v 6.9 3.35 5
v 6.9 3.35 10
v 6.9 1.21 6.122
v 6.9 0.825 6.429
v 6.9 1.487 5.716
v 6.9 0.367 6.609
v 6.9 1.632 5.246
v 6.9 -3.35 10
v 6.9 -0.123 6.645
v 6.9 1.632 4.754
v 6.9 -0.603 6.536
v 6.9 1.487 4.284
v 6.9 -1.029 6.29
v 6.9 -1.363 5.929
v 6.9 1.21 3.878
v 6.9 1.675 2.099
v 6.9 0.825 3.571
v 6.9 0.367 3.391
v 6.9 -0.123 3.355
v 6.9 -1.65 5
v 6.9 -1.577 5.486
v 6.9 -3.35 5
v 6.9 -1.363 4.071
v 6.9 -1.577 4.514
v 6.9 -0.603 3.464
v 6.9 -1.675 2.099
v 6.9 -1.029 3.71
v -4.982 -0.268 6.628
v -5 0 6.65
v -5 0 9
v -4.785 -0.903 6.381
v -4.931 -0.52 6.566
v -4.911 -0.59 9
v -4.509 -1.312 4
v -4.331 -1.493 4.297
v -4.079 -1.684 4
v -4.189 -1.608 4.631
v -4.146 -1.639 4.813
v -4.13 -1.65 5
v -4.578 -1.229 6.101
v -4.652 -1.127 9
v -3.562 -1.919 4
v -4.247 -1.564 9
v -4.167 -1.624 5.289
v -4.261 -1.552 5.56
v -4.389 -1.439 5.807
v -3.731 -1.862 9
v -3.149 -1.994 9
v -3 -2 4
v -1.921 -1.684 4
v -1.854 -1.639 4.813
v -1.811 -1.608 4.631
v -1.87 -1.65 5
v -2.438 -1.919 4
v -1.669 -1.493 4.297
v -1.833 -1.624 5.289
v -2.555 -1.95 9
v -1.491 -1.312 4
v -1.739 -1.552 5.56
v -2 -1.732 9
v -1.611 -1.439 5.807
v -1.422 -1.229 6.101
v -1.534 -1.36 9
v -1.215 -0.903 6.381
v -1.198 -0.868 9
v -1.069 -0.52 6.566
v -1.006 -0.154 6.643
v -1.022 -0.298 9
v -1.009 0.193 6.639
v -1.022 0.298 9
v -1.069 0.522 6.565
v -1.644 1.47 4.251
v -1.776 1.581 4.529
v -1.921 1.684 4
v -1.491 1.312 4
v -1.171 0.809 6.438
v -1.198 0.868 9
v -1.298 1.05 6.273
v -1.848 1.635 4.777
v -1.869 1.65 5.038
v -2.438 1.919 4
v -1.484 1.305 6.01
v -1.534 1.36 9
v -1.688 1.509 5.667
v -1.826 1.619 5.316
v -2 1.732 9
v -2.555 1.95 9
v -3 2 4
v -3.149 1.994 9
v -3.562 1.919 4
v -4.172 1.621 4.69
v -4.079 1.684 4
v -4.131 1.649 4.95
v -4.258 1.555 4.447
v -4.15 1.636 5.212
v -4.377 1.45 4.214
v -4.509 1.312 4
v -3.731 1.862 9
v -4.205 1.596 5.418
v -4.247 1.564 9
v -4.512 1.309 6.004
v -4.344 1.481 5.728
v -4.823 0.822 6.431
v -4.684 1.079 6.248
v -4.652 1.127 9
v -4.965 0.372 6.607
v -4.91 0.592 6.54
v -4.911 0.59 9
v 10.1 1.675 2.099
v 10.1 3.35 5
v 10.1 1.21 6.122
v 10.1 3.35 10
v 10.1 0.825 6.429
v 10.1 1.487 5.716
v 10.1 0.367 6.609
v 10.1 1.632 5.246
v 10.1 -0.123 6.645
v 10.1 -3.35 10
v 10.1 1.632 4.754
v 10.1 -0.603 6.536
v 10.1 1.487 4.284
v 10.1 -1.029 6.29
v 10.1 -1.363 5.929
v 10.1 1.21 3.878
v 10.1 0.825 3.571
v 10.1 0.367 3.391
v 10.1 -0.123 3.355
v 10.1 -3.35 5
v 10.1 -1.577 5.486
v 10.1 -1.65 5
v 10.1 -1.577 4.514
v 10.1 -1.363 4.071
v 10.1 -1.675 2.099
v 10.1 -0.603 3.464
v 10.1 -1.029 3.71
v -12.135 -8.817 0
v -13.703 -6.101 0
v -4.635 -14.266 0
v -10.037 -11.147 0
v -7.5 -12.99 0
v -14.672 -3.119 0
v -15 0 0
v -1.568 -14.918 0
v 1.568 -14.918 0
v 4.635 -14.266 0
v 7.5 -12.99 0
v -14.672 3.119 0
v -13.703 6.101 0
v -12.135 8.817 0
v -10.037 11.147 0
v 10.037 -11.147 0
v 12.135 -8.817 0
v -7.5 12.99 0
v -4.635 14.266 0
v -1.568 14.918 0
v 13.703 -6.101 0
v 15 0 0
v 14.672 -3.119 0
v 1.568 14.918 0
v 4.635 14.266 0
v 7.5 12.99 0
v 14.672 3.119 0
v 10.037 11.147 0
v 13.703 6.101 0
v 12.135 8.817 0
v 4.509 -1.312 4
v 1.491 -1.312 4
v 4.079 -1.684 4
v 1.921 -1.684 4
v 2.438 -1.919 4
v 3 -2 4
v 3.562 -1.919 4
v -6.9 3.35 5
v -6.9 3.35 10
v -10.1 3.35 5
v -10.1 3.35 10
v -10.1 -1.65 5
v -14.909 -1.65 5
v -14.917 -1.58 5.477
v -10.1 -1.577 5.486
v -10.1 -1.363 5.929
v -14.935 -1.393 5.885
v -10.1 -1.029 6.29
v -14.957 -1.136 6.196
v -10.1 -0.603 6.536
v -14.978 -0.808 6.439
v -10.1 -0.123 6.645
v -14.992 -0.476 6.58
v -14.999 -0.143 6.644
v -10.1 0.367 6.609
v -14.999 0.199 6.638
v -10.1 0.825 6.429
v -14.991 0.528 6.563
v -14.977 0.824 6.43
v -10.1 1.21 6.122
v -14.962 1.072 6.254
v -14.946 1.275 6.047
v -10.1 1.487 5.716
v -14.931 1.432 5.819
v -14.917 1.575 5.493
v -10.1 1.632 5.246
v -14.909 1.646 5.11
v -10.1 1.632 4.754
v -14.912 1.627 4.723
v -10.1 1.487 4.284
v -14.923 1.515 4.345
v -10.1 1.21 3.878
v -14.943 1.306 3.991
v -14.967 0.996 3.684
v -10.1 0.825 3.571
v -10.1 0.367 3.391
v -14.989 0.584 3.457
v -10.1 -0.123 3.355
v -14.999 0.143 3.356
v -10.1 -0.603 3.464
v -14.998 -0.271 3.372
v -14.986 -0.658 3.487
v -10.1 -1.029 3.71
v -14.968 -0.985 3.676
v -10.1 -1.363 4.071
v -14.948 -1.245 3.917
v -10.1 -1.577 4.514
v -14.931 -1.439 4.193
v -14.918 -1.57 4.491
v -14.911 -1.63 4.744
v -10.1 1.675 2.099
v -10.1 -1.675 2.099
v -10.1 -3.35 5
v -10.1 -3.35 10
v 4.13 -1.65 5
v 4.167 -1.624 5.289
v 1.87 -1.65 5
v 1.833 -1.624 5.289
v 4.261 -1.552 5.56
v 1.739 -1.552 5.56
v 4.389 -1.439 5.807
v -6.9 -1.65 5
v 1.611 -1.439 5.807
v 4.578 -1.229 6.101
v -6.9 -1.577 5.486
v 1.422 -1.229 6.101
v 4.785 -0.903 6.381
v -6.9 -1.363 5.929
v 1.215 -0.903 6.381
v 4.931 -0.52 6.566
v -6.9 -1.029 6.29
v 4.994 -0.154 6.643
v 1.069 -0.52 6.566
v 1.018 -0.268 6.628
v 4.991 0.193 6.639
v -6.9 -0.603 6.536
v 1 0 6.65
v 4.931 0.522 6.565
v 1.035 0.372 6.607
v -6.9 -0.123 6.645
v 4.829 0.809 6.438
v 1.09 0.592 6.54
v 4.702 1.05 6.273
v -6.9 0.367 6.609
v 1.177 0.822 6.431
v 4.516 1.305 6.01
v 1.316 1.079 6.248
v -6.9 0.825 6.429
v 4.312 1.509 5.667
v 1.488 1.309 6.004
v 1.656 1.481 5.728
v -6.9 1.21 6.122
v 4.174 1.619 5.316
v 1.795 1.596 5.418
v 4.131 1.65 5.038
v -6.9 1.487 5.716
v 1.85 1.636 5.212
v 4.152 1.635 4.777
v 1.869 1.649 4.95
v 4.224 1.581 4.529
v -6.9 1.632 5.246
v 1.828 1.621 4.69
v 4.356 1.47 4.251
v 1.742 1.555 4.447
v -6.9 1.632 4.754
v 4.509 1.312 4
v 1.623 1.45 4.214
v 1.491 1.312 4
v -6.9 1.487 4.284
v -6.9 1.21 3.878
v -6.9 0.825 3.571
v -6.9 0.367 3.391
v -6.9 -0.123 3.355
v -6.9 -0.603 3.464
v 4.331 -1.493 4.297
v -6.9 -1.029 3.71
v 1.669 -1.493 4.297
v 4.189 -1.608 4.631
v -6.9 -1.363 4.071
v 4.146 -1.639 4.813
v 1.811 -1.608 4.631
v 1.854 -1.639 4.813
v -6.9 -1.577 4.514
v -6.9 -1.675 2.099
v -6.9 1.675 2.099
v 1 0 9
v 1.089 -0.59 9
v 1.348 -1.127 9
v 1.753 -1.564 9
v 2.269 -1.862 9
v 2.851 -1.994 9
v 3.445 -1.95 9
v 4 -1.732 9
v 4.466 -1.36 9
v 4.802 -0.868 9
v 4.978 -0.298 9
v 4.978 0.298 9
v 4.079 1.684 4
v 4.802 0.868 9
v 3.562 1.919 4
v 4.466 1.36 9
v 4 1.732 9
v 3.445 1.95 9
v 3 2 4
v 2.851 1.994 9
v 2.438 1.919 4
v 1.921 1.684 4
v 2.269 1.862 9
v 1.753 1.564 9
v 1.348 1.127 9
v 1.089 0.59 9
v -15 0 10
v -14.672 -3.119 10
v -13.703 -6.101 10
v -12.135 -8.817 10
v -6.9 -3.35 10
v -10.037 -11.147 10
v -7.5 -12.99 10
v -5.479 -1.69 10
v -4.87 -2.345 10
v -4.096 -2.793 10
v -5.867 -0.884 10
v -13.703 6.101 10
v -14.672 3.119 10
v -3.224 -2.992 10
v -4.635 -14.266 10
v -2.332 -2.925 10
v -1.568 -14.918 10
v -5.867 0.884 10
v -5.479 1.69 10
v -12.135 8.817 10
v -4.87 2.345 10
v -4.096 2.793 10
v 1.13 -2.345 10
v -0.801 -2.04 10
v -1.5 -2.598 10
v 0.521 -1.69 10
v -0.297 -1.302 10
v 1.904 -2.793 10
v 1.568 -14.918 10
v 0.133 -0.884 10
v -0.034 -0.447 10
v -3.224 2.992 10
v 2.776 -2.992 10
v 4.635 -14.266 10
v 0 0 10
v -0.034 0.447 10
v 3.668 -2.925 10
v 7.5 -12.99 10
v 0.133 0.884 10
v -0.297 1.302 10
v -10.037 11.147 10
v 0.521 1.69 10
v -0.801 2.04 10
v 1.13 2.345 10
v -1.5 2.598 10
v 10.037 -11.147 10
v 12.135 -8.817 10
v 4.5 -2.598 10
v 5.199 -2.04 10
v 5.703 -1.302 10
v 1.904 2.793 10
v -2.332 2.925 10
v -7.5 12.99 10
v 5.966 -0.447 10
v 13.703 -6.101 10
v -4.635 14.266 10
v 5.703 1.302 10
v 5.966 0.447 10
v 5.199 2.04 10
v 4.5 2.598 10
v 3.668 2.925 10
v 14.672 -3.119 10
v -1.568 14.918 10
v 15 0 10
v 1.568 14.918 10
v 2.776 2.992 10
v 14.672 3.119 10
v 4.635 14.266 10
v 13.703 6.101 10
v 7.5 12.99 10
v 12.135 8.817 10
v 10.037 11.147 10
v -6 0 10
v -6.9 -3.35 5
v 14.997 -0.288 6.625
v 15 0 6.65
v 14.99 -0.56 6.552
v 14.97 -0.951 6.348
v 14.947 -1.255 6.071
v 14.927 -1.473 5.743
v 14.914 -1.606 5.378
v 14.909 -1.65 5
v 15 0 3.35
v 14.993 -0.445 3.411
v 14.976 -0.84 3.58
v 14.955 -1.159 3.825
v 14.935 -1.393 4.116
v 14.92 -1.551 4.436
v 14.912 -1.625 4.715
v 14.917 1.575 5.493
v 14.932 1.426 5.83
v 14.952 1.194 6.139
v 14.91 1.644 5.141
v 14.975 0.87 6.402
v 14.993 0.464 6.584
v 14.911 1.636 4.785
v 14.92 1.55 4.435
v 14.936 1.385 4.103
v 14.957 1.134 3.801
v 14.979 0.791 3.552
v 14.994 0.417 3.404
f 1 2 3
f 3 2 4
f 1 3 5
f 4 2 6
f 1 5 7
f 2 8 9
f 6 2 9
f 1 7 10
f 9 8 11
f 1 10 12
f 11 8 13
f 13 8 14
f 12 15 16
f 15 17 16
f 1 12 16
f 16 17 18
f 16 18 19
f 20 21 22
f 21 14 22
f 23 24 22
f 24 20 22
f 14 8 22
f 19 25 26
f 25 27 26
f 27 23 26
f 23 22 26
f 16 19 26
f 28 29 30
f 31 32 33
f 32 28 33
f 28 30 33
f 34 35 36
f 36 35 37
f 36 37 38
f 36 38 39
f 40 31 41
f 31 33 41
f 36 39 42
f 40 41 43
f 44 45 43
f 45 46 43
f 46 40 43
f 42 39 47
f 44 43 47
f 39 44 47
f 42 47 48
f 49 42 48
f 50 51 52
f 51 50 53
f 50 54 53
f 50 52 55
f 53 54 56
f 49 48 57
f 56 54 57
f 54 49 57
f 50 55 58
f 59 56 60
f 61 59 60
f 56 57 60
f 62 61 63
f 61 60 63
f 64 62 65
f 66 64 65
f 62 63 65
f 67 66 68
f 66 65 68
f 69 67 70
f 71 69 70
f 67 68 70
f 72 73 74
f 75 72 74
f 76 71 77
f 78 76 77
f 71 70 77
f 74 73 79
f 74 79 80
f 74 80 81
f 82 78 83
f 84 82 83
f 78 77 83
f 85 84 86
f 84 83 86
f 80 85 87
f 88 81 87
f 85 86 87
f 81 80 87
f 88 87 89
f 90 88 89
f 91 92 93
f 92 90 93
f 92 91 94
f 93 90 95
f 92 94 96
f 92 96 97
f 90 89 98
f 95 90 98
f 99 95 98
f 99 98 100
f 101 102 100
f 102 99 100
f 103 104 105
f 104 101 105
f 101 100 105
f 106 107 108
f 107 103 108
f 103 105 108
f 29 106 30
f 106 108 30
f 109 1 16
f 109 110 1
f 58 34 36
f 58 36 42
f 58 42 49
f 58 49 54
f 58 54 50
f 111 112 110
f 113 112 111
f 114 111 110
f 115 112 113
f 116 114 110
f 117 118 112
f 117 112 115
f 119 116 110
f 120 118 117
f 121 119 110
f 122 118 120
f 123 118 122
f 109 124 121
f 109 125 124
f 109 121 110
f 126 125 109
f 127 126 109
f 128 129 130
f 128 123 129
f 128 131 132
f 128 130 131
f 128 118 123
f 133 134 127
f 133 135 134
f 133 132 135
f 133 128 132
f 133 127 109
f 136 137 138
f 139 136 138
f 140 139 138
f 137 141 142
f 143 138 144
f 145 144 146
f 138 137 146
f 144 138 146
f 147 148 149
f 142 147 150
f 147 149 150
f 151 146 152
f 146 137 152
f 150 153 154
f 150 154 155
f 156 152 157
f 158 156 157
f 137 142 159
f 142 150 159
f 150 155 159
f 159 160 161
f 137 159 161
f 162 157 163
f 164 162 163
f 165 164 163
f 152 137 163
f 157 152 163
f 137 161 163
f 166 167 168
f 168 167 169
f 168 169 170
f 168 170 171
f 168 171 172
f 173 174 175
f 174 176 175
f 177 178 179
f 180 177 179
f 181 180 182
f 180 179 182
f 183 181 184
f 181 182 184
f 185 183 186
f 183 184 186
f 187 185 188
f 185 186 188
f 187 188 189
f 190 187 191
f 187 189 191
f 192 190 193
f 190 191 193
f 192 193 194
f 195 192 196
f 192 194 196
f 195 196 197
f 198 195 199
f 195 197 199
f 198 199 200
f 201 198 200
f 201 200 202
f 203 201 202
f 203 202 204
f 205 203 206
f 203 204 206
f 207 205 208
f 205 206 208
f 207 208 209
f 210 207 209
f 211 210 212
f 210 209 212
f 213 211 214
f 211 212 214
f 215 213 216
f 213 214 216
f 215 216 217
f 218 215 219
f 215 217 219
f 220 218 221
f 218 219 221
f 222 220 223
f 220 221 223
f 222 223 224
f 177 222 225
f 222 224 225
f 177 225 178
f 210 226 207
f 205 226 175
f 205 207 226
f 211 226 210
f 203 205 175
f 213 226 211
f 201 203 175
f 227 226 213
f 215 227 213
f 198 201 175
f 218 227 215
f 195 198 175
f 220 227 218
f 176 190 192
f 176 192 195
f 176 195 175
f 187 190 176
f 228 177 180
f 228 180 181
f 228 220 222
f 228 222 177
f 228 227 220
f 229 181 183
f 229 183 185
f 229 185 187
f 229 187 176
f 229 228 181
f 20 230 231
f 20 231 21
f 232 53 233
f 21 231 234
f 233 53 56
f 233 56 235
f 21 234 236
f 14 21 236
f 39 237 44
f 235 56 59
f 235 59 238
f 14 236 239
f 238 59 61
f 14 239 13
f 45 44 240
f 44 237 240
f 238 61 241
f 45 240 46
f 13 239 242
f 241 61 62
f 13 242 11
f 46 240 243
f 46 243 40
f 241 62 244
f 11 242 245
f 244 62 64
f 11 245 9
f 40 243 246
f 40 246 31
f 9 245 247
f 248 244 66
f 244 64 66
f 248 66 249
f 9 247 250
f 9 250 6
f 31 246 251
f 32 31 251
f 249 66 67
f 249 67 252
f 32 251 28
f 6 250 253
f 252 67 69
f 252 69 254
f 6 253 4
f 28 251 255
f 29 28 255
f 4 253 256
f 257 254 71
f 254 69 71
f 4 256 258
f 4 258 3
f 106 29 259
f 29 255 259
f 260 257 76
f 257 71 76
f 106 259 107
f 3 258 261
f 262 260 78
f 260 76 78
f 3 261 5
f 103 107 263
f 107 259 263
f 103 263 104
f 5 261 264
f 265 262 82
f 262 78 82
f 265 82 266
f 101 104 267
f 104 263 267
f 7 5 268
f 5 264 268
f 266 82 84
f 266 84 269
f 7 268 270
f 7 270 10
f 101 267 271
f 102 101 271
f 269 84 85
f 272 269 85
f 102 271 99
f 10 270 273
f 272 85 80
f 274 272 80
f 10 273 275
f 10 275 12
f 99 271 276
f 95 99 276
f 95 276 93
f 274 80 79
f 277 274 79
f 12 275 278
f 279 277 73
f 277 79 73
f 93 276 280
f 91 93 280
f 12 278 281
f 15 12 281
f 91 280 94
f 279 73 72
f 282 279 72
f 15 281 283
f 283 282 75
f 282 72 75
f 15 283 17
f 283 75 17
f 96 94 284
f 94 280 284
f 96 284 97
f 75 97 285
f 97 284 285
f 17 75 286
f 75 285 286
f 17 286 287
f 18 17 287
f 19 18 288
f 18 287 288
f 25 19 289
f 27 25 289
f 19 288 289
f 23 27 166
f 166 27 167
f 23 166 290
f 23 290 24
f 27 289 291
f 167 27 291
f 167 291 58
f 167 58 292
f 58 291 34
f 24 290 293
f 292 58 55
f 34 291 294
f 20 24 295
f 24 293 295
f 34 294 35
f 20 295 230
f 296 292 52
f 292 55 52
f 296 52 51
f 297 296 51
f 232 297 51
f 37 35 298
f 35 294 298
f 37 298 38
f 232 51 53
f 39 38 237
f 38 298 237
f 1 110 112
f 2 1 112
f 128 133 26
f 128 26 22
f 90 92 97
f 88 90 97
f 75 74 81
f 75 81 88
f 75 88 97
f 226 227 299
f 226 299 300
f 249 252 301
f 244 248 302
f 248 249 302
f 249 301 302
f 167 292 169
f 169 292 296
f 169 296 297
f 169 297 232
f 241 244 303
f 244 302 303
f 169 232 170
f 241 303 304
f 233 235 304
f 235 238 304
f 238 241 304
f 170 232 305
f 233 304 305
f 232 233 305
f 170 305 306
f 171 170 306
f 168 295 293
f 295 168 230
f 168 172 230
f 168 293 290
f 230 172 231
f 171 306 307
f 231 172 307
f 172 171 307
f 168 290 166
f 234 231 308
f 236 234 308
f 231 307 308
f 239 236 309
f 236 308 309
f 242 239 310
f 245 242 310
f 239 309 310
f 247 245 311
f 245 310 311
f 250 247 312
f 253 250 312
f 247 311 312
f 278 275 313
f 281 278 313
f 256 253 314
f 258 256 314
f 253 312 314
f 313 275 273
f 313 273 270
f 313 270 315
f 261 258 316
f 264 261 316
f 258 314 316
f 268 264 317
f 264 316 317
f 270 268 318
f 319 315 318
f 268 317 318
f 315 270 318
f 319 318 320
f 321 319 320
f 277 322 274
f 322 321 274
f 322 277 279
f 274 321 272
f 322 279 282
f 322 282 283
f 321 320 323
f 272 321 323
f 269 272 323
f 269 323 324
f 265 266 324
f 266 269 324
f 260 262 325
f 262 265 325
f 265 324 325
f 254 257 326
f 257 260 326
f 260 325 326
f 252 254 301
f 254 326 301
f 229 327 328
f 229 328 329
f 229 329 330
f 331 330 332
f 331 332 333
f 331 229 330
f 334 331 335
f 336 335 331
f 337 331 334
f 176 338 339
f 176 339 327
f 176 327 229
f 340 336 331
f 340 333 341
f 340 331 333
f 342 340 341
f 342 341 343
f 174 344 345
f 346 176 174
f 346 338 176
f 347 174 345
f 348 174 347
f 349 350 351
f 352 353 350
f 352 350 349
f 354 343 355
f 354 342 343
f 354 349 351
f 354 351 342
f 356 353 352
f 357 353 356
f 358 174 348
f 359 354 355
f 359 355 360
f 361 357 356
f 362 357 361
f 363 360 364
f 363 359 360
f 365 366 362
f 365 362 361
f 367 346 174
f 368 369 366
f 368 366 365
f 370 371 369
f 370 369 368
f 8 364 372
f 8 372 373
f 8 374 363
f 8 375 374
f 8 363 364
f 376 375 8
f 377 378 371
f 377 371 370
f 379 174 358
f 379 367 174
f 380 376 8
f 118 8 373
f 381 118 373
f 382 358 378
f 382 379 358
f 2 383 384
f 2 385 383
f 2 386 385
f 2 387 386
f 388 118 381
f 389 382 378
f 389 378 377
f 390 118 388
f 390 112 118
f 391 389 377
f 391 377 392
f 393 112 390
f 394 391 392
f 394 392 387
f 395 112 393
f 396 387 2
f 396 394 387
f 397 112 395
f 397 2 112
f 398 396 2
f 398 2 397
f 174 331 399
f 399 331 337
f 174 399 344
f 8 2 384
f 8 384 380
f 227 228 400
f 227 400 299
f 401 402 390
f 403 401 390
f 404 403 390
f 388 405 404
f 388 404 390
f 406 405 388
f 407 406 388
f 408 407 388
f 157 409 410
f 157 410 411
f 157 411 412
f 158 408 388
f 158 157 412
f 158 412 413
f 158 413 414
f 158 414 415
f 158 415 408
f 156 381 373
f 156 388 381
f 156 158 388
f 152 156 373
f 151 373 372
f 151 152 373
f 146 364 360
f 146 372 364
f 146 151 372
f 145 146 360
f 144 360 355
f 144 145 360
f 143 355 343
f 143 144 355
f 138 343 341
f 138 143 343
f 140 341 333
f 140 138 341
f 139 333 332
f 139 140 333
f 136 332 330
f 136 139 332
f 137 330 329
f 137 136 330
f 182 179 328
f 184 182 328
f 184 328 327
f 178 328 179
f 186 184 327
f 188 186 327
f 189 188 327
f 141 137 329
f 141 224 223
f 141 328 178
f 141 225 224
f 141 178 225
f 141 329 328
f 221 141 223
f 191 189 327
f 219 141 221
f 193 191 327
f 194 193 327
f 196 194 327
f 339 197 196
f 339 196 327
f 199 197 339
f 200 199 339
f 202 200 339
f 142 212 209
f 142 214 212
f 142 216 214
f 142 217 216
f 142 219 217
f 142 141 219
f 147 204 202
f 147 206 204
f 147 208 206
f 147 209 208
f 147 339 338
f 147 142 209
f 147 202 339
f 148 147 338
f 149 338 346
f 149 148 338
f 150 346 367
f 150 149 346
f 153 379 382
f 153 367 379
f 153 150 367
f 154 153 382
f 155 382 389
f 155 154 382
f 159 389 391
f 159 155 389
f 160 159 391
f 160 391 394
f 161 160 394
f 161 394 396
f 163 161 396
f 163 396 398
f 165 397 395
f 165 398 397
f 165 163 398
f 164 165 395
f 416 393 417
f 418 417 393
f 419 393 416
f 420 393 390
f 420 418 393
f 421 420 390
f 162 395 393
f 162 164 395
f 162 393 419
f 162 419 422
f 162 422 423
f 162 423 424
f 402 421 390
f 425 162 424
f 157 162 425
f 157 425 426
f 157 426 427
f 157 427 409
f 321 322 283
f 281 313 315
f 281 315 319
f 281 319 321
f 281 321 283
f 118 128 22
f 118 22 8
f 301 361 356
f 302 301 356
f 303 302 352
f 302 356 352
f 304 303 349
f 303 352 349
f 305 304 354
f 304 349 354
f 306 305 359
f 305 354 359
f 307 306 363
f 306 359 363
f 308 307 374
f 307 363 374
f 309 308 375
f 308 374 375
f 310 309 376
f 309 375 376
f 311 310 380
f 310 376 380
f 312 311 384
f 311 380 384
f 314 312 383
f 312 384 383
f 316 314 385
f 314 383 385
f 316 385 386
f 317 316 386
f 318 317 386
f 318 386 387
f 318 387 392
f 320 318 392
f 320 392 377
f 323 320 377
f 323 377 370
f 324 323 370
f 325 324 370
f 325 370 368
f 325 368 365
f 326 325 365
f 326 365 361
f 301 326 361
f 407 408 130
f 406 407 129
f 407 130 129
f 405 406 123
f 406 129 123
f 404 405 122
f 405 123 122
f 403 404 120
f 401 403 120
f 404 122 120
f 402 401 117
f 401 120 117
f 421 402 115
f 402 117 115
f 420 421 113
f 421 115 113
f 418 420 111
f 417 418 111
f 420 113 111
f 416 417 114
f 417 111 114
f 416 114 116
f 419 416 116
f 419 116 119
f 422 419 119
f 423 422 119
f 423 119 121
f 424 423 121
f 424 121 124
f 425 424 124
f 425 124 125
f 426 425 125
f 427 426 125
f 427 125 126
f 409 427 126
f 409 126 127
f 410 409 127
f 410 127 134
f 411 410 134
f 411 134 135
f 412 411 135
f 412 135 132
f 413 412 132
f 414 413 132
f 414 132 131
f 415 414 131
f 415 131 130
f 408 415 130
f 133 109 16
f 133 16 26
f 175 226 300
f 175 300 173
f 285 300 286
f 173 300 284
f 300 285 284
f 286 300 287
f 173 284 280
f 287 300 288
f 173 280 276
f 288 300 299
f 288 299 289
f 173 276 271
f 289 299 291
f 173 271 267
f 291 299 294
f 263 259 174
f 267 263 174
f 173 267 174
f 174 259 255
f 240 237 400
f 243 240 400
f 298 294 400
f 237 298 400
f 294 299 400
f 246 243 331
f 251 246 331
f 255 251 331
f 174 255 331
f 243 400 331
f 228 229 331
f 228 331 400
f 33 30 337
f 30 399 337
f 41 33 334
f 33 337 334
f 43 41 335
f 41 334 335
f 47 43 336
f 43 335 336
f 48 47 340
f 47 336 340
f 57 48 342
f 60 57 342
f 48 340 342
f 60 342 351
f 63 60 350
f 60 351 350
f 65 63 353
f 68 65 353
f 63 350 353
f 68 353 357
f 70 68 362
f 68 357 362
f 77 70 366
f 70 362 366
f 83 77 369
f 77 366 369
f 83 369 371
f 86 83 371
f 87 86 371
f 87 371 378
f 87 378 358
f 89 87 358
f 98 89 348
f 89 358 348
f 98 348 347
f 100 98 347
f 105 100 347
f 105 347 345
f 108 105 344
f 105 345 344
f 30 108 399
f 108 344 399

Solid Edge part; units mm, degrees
sketch "Sketch1" plane through (0, 0, 0) normal (0, 0, 1) x (1, 0, 0)
  circle A0 centre (0, 0) radius 15
extrude "ExtrudedProtrusion_1" add sketch "Sketch1" along normal blind 10
sketch "Sketch2" plane through (8.5, 0, 0) normal (-1, 0, 0) x (0, -1, 0)
  line L0 (3.35, 5) -> (3.35, 10)
  line L1 (-3.35, 10) -> (3.35, 10)
  line L2 (-3.35, 5) -> (-3.35, 10)
  line L3 (-3.35, 5) -> (-1.675, 2.0988)
  line L4 (-1.675, 2.0988) -> (1.675, 2.0988)
  line L5 (1.675, 2.0988) -> (3.35, 5)
  circle A0 centre (0, 5) radius 1.65
  dimension "D1" = 6.7
  dimension "D2" = 5
  dimension "D3" = 3.3
extrude "ExtrudedCutout_1" cut sketch "Sketch2" along normal mid plane 3.2
mirror "Mirror1" about plane through (0, 0, 0) normal (-1, 0, 0) of "ExtrudedCutout_1"
sketch "Sketch3" plane through (8.5, 0, 0) normal (-1, 0, 0) x (0, -1, 0)
  circle A0 centre (0, 5) radius 1.65
extrude "Cutout1" cut sketch "Sketch3" against normal through all and the other way through all
sketch "Sketch4" plane through (0, 0, 10) normal (0, 0, 1) x (-1, 0, 0)
  circle A0 centre (-3, 0) radius 2
  circle A1 centre (3, 0) radius 2
  dimension "D1" = 2
  dimension "D2" = 12
  dimension "D3" = 12
  dimension "D4" = 2
  dimension "D5" = 3
extrude "ExtrudedCutout_3" cut sketch "Sketch4" against normal blind 6
chamfer "Chamfer_3" distance 1 angle 45 2 edges at (-1, 0, 10) (5, 0, 10)
